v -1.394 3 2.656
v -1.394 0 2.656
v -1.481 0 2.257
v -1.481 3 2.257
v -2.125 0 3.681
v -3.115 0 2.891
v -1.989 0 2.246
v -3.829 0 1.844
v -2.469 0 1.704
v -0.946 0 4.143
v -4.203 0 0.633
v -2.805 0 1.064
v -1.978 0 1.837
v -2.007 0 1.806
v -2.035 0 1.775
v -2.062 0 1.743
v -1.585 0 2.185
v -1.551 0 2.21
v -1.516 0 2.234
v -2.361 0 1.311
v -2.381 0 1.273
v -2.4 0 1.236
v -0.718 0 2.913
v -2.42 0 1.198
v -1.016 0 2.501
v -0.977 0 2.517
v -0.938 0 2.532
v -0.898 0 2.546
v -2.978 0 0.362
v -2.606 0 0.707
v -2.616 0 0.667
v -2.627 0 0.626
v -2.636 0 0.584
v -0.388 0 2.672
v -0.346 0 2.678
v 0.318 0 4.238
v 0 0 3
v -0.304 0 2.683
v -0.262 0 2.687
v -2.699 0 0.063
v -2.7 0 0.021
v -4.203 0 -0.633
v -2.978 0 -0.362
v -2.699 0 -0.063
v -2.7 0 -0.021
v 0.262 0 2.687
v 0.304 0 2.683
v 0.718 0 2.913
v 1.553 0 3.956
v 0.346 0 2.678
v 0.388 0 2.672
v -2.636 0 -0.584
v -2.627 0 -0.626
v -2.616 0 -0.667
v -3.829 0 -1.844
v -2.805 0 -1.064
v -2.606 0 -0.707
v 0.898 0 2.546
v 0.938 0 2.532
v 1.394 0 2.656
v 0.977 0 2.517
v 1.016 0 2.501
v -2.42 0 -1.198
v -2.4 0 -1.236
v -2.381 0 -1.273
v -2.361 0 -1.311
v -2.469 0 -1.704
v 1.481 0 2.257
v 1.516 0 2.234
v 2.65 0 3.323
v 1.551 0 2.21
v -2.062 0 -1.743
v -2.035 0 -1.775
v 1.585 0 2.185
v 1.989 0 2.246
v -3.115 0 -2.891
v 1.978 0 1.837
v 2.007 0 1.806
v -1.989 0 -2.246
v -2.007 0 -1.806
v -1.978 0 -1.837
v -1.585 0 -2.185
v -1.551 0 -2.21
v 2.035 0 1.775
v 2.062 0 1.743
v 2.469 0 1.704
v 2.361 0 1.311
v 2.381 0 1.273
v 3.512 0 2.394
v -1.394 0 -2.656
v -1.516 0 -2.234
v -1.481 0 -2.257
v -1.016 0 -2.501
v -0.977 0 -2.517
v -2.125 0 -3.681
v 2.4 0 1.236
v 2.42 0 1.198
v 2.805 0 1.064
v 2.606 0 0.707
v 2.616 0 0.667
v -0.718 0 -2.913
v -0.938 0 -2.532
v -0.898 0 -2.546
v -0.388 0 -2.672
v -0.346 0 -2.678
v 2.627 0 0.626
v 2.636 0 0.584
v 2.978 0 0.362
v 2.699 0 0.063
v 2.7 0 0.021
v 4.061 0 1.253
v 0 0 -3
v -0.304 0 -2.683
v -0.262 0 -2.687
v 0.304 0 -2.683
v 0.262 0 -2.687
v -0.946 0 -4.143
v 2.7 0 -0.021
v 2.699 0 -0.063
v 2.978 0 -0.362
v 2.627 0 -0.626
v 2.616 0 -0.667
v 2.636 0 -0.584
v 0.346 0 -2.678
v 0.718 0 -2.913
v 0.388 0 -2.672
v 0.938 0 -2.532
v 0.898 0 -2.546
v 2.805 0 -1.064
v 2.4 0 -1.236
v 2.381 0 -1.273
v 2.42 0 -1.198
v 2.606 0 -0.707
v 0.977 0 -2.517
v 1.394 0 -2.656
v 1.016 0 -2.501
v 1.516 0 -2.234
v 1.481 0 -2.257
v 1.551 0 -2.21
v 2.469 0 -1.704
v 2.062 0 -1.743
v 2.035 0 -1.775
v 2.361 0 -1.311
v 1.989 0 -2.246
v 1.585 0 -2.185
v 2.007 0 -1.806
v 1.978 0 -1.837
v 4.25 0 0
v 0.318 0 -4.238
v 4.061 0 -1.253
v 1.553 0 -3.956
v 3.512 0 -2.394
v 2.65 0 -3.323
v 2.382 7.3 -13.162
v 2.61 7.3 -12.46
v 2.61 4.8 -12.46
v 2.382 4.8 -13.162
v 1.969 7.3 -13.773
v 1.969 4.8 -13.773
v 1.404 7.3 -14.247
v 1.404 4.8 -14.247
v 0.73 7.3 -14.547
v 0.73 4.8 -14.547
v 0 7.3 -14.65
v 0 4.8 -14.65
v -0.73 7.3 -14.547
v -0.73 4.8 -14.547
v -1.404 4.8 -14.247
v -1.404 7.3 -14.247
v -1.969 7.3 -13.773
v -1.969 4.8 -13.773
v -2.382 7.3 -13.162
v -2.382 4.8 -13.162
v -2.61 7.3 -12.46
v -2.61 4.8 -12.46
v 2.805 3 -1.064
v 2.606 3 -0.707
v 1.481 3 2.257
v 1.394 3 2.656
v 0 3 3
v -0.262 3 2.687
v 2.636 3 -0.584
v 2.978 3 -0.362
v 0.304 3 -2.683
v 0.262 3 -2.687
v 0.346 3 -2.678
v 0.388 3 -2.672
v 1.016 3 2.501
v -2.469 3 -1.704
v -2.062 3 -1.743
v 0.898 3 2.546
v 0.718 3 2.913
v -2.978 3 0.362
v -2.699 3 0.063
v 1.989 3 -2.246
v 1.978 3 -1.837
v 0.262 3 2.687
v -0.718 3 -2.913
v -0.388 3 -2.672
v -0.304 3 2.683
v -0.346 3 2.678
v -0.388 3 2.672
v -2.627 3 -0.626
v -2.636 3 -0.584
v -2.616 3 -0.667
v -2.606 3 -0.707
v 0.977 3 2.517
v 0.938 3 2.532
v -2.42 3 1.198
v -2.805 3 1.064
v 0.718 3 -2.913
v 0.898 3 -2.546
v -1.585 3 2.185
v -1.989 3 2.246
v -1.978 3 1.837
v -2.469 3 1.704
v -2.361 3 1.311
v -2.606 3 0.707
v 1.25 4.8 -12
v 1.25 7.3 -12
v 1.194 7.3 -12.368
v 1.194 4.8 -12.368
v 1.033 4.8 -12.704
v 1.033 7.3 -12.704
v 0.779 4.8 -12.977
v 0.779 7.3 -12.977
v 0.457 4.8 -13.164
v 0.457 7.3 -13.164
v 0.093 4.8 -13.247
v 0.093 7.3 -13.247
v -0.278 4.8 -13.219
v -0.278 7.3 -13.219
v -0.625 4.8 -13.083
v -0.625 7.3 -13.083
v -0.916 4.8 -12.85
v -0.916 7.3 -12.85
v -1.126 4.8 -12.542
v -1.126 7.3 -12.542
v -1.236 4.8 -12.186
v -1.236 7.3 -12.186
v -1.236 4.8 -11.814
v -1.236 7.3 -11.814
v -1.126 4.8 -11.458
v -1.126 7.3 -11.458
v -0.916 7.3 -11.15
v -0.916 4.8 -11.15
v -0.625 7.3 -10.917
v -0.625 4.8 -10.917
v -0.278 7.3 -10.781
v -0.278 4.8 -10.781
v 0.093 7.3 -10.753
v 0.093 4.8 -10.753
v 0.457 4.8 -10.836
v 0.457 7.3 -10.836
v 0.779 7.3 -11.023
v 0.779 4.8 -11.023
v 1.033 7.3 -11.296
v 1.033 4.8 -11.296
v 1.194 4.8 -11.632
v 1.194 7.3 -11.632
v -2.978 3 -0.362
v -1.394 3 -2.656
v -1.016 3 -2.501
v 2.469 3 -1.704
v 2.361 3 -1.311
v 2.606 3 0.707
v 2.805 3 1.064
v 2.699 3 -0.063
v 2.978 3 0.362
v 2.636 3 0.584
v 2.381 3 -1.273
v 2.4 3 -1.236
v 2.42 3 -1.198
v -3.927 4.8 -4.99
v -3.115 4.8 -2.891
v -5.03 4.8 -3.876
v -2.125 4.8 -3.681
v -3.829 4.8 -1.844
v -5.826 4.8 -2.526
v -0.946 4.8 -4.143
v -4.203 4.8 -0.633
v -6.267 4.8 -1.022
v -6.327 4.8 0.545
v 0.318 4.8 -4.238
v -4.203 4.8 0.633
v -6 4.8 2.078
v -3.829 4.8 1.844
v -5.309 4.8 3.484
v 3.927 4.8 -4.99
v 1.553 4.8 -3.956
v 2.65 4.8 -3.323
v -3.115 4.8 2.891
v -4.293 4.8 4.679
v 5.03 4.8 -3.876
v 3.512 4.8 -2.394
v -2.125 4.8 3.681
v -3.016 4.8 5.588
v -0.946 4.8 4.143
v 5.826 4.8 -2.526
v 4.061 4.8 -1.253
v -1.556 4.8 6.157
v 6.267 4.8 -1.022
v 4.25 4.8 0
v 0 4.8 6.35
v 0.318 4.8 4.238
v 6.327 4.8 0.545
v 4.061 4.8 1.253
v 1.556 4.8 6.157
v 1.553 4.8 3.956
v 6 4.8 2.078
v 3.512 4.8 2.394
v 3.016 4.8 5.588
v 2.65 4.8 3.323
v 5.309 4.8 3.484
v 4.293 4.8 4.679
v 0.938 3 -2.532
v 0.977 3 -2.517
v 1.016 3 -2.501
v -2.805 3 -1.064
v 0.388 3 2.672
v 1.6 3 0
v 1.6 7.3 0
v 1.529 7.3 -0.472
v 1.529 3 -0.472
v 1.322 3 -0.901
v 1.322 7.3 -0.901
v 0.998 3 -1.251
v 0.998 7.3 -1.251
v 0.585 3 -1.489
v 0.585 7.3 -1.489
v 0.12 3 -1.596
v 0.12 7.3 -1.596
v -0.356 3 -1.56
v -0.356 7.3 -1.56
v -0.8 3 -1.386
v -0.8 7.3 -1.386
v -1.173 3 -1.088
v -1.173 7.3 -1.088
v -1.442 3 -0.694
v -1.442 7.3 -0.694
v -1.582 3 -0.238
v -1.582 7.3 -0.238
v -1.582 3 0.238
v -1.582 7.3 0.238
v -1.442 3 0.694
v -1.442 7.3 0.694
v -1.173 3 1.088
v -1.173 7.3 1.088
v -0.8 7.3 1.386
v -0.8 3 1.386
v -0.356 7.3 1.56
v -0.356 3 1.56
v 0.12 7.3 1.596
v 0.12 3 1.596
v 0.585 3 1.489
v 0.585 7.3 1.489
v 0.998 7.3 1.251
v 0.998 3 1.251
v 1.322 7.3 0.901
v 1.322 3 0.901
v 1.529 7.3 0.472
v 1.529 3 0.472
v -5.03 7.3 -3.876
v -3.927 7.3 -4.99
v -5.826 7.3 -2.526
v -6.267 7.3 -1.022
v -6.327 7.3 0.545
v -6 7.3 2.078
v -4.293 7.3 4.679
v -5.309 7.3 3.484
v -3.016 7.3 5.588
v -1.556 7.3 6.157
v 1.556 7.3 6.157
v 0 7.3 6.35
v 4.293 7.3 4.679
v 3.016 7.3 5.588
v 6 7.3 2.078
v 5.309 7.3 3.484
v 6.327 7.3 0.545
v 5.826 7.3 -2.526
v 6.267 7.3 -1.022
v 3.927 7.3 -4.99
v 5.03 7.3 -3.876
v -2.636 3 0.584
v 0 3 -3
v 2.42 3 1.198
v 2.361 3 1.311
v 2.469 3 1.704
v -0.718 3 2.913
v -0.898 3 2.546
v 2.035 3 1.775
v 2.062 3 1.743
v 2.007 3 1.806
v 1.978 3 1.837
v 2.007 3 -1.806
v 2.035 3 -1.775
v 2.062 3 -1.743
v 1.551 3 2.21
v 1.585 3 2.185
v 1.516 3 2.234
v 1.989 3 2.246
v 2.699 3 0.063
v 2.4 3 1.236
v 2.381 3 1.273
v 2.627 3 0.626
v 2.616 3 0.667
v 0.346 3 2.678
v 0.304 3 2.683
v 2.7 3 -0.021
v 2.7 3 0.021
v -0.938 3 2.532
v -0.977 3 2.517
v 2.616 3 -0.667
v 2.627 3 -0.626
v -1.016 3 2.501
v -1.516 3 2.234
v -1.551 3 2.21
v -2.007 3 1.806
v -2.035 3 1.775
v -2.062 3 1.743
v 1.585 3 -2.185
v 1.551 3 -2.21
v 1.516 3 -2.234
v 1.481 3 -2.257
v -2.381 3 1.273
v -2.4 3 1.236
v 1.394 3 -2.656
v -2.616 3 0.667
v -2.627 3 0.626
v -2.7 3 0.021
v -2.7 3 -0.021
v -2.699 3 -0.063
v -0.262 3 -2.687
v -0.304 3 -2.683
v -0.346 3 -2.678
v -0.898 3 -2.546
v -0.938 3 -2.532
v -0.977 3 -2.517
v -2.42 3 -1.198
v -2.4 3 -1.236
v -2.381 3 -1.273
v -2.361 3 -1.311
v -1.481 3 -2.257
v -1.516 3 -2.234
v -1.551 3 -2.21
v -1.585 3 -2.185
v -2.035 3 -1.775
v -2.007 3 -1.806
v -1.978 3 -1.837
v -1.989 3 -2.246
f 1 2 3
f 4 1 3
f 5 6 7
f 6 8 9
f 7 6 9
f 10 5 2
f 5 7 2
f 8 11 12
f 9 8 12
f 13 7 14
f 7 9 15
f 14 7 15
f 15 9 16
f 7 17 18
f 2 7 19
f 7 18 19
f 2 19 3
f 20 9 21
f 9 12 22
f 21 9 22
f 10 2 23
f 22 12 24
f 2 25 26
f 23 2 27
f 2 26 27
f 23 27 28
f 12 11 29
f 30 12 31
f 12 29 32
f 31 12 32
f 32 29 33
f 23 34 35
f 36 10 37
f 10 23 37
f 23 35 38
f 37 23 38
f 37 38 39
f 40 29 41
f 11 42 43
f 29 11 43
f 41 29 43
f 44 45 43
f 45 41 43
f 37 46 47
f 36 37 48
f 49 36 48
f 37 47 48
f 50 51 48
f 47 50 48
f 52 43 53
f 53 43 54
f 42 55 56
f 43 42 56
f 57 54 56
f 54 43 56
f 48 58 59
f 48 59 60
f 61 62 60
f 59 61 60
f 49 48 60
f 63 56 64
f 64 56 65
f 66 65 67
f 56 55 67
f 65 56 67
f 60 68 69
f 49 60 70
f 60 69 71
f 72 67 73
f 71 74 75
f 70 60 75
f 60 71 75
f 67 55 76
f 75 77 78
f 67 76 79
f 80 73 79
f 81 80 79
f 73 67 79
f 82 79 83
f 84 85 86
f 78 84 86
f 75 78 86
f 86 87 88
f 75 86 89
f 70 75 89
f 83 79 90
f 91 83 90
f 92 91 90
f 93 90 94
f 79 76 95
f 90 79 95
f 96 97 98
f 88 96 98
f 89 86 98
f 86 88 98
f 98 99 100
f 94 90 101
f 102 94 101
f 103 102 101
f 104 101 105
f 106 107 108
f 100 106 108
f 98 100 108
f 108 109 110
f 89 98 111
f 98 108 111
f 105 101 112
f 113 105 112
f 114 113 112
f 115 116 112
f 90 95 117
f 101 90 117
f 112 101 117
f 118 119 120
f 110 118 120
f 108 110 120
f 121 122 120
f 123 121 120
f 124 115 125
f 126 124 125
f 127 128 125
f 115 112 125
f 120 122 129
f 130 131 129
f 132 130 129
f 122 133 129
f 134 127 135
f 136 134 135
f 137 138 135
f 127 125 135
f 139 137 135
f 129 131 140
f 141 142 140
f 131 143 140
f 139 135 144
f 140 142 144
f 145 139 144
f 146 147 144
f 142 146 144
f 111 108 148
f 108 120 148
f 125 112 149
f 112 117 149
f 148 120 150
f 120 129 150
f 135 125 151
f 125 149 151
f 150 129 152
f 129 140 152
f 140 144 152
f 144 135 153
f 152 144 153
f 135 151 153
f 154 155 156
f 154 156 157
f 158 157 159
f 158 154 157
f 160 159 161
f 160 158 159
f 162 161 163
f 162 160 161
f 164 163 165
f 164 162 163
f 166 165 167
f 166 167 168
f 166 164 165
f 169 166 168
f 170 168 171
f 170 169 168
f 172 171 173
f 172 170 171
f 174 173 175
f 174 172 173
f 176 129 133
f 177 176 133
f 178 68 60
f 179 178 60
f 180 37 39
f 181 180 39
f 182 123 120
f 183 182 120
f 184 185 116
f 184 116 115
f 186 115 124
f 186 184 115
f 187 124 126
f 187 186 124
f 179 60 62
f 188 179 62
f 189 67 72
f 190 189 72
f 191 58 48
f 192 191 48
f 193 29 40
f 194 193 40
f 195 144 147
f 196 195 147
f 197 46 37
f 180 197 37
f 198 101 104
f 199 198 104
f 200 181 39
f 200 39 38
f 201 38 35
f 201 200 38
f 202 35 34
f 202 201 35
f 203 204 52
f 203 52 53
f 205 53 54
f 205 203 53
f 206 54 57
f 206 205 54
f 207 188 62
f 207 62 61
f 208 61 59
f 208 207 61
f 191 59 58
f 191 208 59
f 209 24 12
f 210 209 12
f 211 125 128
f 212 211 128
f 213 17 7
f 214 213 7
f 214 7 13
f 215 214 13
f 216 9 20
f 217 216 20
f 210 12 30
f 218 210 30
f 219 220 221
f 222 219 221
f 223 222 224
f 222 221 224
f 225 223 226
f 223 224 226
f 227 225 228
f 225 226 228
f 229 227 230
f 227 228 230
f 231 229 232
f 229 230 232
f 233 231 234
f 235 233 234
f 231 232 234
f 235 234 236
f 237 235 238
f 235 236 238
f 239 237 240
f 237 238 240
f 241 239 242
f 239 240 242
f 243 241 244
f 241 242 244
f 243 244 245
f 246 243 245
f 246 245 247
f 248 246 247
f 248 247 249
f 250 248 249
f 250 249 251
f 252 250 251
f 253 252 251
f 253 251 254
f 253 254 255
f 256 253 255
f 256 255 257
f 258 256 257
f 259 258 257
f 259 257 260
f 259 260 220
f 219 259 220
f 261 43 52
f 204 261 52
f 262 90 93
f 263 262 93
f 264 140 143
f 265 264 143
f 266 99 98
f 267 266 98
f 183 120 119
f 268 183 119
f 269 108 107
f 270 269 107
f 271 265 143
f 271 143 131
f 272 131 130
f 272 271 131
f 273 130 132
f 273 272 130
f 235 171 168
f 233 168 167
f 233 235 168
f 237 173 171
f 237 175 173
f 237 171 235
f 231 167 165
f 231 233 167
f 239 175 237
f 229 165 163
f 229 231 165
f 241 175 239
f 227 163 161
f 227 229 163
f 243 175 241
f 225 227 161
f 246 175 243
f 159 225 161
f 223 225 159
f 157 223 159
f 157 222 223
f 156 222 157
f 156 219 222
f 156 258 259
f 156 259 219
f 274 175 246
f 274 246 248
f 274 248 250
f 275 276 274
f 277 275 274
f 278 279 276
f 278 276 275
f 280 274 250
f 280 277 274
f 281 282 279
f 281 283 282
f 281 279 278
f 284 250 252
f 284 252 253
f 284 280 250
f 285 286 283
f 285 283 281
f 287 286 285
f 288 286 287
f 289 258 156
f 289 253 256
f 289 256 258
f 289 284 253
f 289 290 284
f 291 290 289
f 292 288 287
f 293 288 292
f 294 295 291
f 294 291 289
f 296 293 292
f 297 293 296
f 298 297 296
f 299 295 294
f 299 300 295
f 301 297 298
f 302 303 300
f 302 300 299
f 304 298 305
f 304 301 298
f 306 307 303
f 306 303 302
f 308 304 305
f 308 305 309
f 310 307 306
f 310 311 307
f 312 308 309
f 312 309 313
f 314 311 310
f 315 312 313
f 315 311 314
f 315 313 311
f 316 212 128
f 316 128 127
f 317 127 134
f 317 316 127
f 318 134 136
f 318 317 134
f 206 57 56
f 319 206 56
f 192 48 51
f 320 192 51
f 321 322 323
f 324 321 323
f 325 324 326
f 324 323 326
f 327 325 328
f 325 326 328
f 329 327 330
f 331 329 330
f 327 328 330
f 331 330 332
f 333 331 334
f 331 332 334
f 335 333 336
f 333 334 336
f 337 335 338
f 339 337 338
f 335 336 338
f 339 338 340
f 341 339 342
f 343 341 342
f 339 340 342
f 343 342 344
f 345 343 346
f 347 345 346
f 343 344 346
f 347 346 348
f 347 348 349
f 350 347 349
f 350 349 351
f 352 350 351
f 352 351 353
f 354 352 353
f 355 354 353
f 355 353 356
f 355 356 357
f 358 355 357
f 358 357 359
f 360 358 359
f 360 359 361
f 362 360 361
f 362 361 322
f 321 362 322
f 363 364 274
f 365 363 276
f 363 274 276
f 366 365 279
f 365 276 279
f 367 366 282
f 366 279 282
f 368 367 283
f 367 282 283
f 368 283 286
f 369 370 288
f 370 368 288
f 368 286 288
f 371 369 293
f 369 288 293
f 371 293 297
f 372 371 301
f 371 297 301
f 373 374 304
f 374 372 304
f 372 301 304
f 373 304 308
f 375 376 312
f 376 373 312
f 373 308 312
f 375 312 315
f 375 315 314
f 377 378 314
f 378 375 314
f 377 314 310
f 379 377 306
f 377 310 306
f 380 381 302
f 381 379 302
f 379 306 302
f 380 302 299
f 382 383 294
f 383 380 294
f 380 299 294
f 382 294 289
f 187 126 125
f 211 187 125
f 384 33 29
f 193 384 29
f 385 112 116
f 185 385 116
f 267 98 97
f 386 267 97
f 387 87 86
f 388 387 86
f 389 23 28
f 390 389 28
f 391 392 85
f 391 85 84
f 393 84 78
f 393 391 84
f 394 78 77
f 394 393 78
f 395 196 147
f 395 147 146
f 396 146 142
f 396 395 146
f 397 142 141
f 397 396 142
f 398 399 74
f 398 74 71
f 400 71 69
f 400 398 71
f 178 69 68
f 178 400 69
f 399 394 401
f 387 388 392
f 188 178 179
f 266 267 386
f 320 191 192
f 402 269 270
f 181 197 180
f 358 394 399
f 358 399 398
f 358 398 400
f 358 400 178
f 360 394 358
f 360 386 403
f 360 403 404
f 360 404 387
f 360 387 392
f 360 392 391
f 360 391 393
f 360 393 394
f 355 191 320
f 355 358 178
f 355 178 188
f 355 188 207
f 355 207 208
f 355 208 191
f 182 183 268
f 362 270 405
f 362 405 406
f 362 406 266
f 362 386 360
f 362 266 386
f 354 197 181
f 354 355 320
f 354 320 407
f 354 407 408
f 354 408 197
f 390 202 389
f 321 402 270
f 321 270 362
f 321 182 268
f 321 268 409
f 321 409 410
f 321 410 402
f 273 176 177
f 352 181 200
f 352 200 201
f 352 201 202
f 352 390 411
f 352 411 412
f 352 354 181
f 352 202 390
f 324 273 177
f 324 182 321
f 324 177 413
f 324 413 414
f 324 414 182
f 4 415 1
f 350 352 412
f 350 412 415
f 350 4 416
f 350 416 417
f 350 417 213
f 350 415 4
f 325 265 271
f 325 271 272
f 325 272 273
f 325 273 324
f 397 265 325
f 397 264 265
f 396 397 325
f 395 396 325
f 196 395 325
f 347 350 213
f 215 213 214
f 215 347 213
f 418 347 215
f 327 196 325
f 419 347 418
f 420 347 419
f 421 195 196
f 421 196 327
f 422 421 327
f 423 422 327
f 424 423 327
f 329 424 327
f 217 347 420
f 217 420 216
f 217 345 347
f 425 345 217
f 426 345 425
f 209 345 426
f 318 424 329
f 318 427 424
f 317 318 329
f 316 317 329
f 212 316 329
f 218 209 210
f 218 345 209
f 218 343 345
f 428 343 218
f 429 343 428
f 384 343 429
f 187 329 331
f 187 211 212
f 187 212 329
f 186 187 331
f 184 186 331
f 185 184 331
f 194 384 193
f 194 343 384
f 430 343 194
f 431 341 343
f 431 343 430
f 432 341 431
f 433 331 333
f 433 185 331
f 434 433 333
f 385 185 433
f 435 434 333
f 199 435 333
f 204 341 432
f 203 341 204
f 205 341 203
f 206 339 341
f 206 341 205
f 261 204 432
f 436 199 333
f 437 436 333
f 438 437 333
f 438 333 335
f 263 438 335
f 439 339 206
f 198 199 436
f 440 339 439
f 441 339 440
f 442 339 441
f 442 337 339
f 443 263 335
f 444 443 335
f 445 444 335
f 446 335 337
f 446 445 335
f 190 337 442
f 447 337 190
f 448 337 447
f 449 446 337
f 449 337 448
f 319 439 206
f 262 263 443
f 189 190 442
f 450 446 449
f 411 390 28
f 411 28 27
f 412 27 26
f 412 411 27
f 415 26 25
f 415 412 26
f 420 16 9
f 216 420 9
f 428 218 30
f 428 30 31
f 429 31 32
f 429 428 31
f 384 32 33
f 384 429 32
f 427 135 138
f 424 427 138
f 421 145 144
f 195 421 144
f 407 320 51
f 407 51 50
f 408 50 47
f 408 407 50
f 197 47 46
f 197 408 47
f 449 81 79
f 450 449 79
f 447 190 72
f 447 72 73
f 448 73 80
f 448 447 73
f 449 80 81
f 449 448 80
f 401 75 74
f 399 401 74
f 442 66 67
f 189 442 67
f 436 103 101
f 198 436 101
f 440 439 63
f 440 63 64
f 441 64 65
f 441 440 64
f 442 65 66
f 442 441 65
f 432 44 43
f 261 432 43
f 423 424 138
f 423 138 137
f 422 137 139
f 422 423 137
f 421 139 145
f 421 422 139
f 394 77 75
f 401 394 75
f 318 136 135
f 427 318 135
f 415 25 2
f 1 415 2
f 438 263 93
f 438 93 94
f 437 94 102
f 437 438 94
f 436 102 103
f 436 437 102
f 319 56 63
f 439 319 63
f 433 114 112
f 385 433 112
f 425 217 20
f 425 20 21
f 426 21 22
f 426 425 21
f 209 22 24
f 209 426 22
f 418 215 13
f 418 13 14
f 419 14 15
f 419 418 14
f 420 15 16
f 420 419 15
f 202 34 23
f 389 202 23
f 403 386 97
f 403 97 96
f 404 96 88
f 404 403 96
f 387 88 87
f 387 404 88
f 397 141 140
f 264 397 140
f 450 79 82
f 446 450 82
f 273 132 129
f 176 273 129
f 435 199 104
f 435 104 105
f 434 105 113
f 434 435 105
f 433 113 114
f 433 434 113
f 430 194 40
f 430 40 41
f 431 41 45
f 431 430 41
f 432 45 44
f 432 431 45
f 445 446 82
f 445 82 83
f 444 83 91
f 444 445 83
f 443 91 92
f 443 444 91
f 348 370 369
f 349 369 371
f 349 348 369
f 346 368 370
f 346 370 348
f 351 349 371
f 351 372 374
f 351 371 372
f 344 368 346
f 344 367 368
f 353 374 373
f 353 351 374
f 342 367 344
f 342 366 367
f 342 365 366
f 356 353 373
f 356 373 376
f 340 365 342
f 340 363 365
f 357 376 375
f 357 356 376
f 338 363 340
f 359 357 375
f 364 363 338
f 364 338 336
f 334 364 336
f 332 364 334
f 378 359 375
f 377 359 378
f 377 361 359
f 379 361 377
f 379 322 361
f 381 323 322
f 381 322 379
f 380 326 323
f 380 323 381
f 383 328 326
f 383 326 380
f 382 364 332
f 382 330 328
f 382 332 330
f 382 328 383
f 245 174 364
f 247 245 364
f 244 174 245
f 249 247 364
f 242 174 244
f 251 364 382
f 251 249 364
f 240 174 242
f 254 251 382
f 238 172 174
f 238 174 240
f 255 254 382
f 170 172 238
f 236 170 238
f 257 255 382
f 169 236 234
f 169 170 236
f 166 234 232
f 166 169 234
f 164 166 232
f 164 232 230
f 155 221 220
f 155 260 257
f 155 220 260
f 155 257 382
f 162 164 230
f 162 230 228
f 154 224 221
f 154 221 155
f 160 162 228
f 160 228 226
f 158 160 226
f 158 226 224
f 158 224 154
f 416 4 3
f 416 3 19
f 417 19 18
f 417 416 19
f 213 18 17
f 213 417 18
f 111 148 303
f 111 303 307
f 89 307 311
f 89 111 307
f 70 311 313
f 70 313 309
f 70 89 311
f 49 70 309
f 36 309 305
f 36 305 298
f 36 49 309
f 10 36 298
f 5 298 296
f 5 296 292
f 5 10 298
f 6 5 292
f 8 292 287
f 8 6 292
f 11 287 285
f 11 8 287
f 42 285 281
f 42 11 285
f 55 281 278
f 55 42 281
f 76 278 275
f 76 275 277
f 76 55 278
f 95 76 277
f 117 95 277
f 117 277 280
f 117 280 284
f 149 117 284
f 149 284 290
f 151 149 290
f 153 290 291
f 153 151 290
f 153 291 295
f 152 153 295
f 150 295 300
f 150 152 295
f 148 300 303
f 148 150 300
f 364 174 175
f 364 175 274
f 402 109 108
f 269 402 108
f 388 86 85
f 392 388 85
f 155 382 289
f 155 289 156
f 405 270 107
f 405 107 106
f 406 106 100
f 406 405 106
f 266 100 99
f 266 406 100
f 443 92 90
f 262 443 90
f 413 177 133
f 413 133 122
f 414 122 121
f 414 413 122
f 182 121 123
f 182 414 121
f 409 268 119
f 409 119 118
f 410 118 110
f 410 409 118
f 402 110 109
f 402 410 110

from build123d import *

# Parameters (mm, degrees)
BASES_R             = 6.35
BASE_DEPTH          = 7.3
HORN_HALF_DEPTH     = 2.5
TOOTH_DEPTH         = 3
TOOTH_CP_COUNT      = 26
BOTTOM_START        = -3
BOTTOMBORES_R       = 2.7
BOTTOM_BORE_DEPTH   = 3
HOLDINGSHAFTS_R     = 6.35
HOLDINGSHAFTS_R_2   = 4.25
HOLDING_SHAFT_DEPTH = 4.8
HORNATTACHS_R       = 1.25
CUT_EXTRUDE_1_DEPTH = 8.3
TOPBORES_R          = 1.6
CUT_EXTRUDE_2_DEPTH = 8.3


with BuildPart() as part:
    # BaseS → BASE (new body)
    with BuildSketch(Plane(origin=(0, 0, 0), x_dir=(1, 0, 0), z_dir=(0, 1, 0))):
        Circle(BASES_R)
    extrude(amount=BASE_DEPTH)

    # HornHalfS → HORN HALF (add)
    with BuildSketch(Plane(origin=(0, 7.3, 0), x_dir=(1, 0, 0), z_dir=(0, 1, 0))):
        with BuildLine():
            Line((-2.609740545, 12.460167671), (-3.926899835, 4.990186137))
            ThreePointArc((-3.926899835, 4.990186137), (0, 6.35), (3.926899835, 4.990186137))
            Line((3.926899835, 4.990186137), (2.609740545, 12.460167671))
            ThreePointArc((2.609740545, 12.460167671), (0, 14.65), (-2.609740545, 12.460167671))
        make_face()
    extrude(amount=-HORN_HALF_DEPTH)

    # ToothS → TOOTH (cut)
    with BuildSketch(Plane.XZ):
        with BuildLine():
            Line((0, -3), (0.262459231, -2.687213269))
            ThreePointArc((0.262459231, -2.687213269), (0, -2.7), (-0.262459231, -2.687213269))
            Line((-0.262459231, -2.687213269), (0, -3))
        make_face()
    tooth = extrude(amount=-TOOTH_DEPTH, mode=Mode.SUBTRACT)

    # TOOTH CP: TOOTH ×26 about axis
    tooth_cp_axis = Axis((0, 0, 0), (0, 1, 0))
    for i in range(1, TOOTH_CP_COUNT):
        add(tooth.rotate(tooth_cp_axis, i * 360 / TOOTH_CP_COUNT), mode=Mode.SUBTRACT)

    # BottomBoreS → BOTTOM BORE (cut)
    with BuildSketch(Plane(origin=(0, 0, 0), x_dir=(-1, 0, 0), z_dir=(0, -1, 0)).offset(BOTTOM_START)):
        Circle(BOTTOMBORES_R)
    extrude(amount=BOTTOM_BORE_DEPTH, mode=Mode.SUBTRACT)

    # HoldingShaftS → HOLDING SHAFT (cut)
    with BuildSketch(Plane.XZ):
        Circle(HOLDINGSHAFTS_R)
        Circle(HOLDINGSHAFTS_R_2, mode=Mode.SUBTRACT)
    extrude(amount=-HOLDING_SHAFT_DEPTH, mode=Mode.SUBTRACT)

    # HornAttachS → 除料-伸長1 (cut, through all)
    with BuildSketch(Plane(origin=(0, 7.3, 0), x_dir=(1, 0, 0), z_dir=(0, 1, 0))):
        with Locations((0, 12)):
            Circle(HORNATTACHS_R)
    extrude(amount=-CUT_EXTRUDE_1_DEPTH, mode=Mode.SUBTRACT)

    # TopBoreS → 除料-伸長2 (cut, through all)
    with BuildSketch(Plane(origin=(0, 7.3, 0), x_dir=(1, 0, 0), z_dir=(0, 1, 0))):
        Circle(TOPBORES_R)
    extrude(amount=-CUT_EXTRUDE_2_DEPTH, mode=Mode.SUBTRACT)


solid = part.part
